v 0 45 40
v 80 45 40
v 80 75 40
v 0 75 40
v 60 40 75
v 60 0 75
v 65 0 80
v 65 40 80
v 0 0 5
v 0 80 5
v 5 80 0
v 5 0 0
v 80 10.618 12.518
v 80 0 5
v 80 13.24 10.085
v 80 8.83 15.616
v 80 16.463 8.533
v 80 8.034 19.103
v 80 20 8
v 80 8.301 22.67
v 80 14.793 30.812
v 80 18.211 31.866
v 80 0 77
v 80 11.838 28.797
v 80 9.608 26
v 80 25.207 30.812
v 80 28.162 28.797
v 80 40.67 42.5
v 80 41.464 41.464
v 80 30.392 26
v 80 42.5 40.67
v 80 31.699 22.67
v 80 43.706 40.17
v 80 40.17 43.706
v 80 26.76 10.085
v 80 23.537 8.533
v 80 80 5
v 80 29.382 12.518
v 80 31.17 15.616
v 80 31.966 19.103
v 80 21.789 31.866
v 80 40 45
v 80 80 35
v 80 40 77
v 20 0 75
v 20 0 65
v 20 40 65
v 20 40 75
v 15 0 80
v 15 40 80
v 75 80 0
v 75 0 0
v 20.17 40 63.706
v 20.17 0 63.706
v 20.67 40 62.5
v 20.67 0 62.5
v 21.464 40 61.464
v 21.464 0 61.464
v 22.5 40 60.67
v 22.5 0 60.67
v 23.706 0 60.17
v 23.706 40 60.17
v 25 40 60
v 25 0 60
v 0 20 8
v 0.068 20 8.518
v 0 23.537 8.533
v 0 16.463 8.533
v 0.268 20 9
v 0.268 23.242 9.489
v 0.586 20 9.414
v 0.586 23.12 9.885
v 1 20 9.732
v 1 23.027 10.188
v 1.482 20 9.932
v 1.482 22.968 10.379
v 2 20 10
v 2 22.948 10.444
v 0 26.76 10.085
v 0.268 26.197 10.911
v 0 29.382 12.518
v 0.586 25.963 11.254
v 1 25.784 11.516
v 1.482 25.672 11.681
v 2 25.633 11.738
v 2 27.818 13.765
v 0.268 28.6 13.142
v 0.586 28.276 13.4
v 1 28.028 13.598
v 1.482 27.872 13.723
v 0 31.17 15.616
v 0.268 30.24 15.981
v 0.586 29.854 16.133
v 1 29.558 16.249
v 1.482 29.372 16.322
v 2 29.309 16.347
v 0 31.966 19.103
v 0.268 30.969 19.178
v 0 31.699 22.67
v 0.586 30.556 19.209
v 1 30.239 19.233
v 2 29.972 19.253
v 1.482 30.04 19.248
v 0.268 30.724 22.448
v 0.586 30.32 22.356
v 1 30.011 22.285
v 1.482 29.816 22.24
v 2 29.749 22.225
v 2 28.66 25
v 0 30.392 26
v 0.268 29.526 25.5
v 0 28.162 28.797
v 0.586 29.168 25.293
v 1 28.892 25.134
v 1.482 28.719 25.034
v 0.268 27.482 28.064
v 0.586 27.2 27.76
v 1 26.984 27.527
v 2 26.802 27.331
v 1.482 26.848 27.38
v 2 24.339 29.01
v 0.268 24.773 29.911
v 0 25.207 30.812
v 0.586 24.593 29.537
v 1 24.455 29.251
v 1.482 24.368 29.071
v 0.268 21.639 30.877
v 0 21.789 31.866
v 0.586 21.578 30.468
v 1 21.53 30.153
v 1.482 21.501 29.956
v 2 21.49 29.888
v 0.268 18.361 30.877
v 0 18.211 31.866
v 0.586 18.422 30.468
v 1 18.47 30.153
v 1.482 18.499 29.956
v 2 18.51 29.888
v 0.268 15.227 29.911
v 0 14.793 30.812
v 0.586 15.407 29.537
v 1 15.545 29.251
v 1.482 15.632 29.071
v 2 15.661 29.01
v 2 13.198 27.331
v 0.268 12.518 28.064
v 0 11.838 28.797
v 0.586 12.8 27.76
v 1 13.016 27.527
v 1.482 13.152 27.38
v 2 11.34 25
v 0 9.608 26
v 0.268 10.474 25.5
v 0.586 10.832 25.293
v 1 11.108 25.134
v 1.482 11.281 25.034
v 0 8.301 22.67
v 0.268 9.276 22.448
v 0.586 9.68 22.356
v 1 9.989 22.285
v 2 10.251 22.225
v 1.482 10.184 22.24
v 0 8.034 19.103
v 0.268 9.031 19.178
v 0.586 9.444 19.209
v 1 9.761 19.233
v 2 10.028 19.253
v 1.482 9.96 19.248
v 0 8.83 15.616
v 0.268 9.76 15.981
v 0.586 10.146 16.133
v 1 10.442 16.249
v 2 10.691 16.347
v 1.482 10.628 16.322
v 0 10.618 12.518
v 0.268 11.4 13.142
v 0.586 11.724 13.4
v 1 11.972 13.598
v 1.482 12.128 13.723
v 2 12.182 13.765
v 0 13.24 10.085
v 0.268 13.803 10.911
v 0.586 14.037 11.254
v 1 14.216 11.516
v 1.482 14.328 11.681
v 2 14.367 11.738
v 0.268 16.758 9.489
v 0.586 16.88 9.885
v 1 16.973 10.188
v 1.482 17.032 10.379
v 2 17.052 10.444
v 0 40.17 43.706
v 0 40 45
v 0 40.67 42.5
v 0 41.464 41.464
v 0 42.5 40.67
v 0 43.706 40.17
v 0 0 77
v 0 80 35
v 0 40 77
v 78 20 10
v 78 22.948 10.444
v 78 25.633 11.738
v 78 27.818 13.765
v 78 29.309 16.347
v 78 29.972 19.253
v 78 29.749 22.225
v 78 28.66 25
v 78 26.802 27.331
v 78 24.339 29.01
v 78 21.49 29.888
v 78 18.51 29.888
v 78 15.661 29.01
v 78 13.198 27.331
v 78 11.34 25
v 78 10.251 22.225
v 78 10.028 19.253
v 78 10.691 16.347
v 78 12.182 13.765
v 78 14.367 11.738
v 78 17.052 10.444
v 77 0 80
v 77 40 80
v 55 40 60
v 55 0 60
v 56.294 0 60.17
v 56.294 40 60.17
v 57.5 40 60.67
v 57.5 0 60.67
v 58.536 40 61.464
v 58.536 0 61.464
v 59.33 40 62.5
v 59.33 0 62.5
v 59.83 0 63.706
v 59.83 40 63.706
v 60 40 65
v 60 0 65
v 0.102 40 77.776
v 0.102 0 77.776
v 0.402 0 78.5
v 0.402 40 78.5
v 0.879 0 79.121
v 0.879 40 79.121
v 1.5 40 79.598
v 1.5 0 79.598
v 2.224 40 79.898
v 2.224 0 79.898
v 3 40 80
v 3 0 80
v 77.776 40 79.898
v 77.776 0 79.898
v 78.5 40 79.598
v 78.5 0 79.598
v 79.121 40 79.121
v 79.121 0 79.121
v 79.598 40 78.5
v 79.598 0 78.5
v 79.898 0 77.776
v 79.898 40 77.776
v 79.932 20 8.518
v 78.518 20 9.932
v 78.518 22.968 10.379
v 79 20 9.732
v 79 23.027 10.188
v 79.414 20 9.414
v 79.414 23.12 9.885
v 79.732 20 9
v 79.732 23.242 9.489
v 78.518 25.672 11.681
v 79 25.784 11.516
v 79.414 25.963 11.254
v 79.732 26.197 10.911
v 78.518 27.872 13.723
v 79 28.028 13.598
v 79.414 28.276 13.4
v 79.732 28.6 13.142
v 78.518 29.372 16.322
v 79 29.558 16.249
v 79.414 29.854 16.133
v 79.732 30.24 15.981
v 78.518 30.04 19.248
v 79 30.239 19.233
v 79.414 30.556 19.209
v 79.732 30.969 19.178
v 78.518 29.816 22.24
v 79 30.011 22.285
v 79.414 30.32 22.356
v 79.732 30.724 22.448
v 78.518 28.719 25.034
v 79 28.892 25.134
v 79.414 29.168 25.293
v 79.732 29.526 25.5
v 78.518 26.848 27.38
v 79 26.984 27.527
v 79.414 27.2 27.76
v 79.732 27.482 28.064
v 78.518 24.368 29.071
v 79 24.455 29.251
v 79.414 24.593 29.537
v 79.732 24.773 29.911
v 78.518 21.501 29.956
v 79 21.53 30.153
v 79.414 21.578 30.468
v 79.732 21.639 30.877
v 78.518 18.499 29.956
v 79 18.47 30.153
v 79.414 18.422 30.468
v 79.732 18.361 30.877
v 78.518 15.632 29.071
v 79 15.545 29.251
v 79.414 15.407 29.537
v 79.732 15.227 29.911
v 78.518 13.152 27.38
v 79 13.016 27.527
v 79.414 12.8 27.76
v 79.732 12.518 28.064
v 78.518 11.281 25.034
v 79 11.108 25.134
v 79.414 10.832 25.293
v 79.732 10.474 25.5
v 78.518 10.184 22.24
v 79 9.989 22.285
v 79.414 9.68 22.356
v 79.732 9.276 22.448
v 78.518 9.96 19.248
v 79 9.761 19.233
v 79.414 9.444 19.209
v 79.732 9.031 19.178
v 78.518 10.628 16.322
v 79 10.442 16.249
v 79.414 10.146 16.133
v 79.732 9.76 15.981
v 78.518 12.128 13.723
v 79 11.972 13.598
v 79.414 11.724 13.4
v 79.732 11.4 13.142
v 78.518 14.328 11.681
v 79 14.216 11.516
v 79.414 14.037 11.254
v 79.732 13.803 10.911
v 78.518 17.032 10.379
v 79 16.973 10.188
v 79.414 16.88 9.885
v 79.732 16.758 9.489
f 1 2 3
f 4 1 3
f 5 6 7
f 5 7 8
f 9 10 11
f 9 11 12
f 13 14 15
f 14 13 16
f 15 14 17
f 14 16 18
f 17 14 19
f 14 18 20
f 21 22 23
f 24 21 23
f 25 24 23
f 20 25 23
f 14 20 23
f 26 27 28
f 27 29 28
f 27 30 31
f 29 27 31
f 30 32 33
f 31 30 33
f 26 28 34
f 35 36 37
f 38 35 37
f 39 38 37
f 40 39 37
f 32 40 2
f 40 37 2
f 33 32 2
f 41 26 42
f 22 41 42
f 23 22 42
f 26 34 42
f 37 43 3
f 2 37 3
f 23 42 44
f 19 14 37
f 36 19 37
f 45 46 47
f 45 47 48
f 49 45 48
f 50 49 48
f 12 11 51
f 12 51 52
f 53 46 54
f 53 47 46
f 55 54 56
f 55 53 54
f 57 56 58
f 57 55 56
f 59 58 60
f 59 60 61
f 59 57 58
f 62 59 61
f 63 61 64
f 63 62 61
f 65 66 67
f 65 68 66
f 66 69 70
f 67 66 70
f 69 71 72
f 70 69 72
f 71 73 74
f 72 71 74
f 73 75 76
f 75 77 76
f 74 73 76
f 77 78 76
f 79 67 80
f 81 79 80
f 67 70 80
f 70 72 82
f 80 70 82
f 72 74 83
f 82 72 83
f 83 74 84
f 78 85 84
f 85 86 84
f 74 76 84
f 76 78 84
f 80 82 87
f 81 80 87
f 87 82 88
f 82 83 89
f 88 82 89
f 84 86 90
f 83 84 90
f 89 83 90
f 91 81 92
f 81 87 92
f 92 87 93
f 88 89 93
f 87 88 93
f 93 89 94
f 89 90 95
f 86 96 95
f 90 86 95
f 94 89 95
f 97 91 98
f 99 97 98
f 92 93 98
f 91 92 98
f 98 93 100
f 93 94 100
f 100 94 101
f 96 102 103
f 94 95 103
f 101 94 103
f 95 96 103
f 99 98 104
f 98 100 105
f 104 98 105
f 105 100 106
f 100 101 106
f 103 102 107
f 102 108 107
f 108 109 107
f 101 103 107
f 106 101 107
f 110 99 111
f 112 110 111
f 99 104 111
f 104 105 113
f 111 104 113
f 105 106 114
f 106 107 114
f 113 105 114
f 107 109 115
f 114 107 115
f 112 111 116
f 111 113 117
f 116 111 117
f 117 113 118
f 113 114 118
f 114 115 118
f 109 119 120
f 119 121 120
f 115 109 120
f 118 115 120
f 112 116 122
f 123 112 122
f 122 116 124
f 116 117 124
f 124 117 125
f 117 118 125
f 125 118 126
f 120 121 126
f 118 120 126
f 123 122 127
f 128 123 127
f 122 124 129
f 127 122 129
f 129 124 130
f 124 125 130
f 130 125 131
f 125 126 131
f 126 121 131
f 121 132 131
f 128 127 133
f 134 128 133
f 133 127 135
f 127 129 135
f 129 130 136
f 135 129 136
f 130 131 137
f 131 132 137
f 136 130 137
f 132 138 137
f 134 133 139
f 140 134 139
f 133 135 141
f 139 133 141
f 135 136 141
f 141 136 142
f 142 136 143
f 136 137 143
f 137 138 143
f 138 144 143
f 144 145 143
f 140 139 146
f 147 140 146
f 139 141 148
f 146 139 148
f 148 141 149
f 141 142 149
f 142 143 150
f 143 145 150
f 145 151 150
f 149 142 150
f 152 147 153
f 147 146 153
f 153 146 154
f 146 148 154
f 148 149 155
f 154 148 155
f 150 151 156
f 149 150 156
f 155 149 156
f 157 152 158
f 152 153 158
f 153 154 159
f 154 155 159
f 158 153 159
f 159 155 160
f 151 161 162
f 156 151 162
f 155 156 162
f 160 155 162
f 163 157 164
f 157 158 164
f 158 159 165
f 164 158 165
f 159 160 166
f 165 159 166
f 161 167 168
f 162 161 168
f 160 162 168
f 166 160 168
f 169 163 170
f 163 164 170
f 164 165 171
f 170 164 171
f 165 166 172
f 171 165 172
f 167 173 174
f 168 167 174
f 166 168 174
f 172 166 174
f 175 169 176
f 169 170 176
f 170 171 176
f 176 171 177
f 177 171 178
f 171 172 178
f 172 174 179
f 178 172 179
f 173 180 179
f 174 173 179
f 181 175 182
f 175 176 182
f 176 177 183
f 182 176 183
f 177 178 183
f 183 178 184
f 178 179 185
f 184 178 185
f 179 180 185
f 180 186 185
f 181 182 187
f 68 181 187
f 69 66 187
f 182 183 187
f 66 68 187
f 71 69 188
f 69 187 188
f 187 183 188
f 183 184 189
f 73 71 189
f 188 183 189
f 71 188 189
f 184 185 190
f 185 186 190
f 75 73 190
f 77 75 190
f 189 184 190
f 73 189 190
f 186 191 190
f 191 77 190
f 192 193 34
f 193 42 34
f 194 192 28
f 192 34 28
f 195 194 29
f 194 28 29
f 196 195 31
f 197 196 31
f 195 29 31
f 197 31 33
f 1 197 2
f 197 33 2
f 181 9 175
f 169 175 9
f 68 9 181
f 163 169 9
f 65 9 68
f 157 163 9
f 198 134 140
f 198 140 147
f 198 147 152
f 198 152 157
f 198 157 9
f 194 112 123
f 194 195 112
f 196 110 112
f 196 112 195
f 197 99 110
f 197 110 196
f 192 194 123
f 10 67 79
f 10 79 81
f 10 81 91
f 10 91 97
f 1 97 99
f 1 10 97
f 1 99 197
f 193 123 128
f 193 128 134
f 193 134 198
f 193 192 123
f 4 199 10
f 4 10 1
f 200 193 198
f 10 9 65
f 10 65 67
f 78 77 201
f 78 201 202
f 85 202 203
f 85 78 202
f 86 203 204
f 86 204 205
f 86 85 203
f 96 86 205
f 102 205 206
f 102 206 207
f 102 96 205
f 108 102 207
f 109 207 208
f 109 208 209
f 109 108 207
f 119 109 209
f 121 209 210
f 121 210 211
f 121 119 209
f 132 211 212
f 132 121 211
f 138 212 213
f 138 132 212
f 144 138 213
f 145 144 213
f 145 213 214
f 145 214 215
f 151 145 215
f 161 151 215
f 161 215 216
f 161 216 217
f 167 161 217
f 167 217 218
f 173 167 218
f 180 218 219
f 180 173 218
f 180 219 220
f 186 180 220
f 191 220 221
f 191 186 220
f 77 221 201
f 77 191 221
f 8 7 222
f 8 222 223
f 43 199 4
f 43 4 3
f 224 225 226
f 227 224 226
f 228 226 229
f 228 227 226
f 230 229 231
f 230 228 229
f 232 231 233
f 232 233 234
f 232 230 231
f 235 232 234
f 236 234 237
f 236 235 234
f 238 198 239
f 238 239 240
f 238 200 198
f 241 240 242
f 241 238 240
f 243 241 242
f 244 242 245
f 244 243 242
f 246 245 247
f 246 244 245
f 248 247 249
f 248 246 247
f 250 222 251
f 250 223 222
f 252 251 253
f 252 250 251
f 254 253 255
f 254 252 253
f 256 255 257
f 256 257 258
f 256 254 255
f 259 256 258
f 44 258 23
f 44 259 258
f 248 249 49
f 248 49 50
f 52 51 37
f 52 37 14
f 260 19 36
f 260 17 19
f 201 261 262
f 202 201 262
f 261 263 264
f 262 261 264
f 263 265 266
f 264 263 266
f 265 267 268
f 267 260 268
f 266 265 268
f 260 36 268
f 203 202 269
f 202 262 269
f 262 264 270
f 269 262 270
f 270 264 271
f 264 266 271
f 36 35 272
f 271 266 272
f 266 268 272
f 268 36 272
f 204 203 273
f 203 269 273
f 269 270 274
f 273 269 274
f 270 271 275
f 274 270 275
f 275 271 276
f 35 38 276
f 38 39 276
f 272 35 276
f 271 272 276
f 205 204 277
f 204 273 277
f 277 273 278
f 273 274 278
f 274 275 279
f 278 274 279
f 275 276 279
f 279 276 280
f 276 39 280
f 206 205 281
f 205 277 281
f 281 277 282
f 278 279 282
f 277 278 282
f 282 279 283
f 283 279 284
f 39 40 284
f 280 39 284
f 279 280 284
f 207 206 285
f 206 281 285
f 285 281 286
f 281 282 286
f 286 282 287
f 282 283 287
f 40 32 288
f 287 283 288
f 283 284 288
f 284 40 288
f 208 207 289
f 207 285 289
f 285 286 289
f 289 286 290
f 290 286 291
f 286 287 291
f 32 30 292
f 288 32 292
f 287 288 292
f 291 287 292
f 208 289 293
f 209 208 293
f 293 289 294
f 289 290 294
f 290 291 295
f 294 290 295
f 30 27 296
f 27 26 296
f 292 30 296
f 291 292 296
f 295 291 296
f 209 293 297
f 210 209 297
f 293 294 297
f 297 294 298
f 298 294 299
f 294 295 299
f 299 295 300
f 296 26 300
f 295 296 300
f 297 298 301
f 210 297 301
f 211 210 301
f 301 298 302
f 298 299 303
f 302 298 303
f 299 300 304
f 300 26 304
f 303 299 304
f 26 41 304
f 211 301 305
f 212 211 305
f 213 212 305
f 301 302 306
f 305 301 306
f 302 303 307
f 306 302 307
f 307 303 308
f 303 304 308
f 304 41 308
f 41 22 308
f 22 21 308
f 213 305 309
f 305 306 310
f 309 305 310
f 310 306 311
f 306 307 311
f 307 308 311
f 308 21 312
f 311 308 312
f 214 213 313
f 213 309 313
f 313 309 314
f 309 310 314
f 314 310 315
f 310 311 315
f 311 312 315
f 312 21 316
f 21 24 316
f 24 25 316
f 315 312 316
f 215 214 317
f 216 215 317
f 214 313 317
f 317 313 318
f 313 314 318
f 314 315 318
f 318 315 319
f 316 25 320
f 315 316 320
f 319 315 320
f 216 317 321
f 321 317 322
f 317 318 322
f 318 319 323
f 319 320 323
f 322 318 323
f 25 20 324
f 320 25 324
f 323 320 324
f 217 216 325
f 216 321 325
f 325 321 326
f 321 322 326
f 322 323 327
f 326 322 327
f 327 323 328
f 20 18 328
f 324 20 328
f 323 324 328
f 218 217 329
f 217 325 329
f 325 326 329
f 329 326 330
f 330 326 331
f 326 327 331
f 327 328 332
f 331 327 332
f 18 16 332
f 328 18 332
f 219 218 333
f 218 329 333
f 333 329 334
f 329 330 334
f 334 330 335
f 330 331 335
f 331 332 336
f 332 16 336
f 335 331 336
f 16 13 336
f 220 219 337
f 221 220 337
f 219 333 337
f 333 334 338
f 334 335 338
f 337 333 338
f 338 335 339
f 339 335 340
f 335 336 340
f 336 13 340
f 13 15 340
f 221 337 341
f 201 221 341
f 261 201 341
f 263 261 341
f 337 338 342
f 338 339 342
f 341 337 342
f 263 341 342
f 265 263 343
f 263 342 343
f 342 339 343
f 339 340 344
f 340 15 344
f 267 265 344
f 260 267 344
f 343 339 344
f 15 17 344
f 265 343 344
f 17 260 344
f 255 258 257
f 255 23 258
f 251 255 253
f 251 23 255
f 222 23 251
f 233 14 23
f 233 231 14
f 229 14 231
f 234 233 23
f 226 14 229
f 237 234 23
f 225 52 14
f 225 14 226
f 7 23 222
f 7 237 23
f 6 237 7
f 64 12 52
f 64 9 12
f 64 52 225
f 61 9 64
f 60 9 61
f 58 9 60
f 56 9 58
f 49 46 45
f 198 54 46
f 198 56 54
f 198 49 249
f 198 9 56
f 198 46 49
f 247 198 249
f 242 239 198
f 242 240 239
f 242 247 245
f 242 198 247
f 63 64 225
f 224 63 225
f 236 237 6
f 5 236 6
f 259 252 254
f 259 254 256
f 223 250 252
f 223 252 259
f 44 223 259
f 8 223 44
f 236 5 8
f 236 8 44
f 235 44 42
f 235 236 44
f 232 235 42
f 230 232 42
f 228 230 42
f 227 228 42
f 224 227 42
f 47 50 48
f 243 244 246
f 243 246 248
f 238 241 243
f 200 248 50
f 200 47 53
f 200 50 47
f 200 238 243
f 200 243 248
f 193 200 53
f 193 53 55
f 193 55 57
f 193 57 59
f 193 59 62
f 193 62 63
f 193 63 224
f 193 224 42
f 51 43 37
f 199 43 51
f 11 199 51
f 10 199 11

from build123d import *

# Parameters (mm, degrees)
SKETCH4_R           = 10
BOSS_EXTRUDE1_DEPTH = 80
SKETCH5_W           = 40
SKETCH5_H           = 20
CUT_EXTRUDE1_DEPTH  = 139.564064606
FILLET1_R           = 3
CHAMFER1_SIZE       = 5
FILLET2_R           = 5
FILLET4_R           = 5
CHAMFER3_SIZE       = 5
FILLET5_R           = 2
FILLET6_R           = 2
CHAMFER4_SIZE       = 5
CHAMFER5_SIZE       = 5


with BuildPart() as part:
    # Sketch4 → Boss-Extrude1 (new body)
    with BuildSketch(Plane(origin=(0, 0, 0), x_dir=(0, 0, -1), z_dir=(1, 0, 0))):
        Polygon((0, 0), (-80, 0), (-80, 40), (-40, 40), (-40, 80), (0, 80), align=None)
        with Locations((-20, 20)):
            Circle(SKETCH4_R, mode=Mode.SUBTRACT)
    extrude(amount=BOSS_EXTRUDE1_DEPTH)

    # Sketch5 → Cut-Extrude1 (cut, through all)
    with BuildSketch(Plane.XZ):
        with Locations((40, 70)):
            Rectangle(SKETCH5_W, SKETCH5_H)
    extrude(amount=-CUT_EXTRUDE1_DEPTH, mode=Mode.SUBTRACT)

    # Fillet1
    fillet1_edges = [part.edges().sort_by_distance(p)[0] for p in [
        (80, 20, 80),
        (0, 20, 80),
    ]]
    fillet(fillet1_edges, radius=FILLET1_R)

    # Chamfer1
    chamfer1_edges = [part.edges().sort_by_distance(p)[0] for p in [
        (20, 20, 80),
        (60, 20, 80),
    ]]
    chamfer(chamfer1_edges, length=CHAMFER1_SIZE)

    # Fillet2
    fillet2_edges = [part.edges().sort_by_distance(p)[0] for p in [
        (20, 20, 60),
        (60, 20, 60),
    ]]
    fillet(fillet2_edges, radius=FILLET2_R)

    # Fillet4
    fillet4_edges = [part.edges().sort_by_distance(p)[0] for p in [
        (40, 40, 40),
    ]]
    fillet(fillet4_edges, radius=FILLET4_R)

    # Chamfer3
    chamfer3_edges = [part.edges().sort_by_distance(p)[0] for p in [
        (40, 80, 40),
    ]]
    chamfer(chamfer3_edges, length=CHAMFER3_SIZE)

    # Fillet5
    fillet5_edges = [part.edges().sort_by_distance(p)[0] for p in [
        (0, 20, 30),
    ]]
    fillet(fillet5_edges, radius=FILLET5_R)

    # Fillet6
    fillet6_edges = [part.edges().sort_by_distance(p)[0] for p in [
        (80, 20, 30),
    ]]
    fillet(fillet6_edges, radius=FILLET6_R)

    # Chamfer4
    chamfer4_edges = [part.edges().sort_by_distance(p)[0] for p in [
        (80, 40, 0),
    ]]
    chamfer(chamfer4_edges, length=CHAMFER4_SIZE)

    # Chamfer5
    chamfer5_edges = [part.edges().sort_by_distance(p)[0] for p in [
        (0, 40, 0),
    ]]
    chamfer(chamfer5_edges, length=CHAMFER5_SIZE)


solid = part.part
